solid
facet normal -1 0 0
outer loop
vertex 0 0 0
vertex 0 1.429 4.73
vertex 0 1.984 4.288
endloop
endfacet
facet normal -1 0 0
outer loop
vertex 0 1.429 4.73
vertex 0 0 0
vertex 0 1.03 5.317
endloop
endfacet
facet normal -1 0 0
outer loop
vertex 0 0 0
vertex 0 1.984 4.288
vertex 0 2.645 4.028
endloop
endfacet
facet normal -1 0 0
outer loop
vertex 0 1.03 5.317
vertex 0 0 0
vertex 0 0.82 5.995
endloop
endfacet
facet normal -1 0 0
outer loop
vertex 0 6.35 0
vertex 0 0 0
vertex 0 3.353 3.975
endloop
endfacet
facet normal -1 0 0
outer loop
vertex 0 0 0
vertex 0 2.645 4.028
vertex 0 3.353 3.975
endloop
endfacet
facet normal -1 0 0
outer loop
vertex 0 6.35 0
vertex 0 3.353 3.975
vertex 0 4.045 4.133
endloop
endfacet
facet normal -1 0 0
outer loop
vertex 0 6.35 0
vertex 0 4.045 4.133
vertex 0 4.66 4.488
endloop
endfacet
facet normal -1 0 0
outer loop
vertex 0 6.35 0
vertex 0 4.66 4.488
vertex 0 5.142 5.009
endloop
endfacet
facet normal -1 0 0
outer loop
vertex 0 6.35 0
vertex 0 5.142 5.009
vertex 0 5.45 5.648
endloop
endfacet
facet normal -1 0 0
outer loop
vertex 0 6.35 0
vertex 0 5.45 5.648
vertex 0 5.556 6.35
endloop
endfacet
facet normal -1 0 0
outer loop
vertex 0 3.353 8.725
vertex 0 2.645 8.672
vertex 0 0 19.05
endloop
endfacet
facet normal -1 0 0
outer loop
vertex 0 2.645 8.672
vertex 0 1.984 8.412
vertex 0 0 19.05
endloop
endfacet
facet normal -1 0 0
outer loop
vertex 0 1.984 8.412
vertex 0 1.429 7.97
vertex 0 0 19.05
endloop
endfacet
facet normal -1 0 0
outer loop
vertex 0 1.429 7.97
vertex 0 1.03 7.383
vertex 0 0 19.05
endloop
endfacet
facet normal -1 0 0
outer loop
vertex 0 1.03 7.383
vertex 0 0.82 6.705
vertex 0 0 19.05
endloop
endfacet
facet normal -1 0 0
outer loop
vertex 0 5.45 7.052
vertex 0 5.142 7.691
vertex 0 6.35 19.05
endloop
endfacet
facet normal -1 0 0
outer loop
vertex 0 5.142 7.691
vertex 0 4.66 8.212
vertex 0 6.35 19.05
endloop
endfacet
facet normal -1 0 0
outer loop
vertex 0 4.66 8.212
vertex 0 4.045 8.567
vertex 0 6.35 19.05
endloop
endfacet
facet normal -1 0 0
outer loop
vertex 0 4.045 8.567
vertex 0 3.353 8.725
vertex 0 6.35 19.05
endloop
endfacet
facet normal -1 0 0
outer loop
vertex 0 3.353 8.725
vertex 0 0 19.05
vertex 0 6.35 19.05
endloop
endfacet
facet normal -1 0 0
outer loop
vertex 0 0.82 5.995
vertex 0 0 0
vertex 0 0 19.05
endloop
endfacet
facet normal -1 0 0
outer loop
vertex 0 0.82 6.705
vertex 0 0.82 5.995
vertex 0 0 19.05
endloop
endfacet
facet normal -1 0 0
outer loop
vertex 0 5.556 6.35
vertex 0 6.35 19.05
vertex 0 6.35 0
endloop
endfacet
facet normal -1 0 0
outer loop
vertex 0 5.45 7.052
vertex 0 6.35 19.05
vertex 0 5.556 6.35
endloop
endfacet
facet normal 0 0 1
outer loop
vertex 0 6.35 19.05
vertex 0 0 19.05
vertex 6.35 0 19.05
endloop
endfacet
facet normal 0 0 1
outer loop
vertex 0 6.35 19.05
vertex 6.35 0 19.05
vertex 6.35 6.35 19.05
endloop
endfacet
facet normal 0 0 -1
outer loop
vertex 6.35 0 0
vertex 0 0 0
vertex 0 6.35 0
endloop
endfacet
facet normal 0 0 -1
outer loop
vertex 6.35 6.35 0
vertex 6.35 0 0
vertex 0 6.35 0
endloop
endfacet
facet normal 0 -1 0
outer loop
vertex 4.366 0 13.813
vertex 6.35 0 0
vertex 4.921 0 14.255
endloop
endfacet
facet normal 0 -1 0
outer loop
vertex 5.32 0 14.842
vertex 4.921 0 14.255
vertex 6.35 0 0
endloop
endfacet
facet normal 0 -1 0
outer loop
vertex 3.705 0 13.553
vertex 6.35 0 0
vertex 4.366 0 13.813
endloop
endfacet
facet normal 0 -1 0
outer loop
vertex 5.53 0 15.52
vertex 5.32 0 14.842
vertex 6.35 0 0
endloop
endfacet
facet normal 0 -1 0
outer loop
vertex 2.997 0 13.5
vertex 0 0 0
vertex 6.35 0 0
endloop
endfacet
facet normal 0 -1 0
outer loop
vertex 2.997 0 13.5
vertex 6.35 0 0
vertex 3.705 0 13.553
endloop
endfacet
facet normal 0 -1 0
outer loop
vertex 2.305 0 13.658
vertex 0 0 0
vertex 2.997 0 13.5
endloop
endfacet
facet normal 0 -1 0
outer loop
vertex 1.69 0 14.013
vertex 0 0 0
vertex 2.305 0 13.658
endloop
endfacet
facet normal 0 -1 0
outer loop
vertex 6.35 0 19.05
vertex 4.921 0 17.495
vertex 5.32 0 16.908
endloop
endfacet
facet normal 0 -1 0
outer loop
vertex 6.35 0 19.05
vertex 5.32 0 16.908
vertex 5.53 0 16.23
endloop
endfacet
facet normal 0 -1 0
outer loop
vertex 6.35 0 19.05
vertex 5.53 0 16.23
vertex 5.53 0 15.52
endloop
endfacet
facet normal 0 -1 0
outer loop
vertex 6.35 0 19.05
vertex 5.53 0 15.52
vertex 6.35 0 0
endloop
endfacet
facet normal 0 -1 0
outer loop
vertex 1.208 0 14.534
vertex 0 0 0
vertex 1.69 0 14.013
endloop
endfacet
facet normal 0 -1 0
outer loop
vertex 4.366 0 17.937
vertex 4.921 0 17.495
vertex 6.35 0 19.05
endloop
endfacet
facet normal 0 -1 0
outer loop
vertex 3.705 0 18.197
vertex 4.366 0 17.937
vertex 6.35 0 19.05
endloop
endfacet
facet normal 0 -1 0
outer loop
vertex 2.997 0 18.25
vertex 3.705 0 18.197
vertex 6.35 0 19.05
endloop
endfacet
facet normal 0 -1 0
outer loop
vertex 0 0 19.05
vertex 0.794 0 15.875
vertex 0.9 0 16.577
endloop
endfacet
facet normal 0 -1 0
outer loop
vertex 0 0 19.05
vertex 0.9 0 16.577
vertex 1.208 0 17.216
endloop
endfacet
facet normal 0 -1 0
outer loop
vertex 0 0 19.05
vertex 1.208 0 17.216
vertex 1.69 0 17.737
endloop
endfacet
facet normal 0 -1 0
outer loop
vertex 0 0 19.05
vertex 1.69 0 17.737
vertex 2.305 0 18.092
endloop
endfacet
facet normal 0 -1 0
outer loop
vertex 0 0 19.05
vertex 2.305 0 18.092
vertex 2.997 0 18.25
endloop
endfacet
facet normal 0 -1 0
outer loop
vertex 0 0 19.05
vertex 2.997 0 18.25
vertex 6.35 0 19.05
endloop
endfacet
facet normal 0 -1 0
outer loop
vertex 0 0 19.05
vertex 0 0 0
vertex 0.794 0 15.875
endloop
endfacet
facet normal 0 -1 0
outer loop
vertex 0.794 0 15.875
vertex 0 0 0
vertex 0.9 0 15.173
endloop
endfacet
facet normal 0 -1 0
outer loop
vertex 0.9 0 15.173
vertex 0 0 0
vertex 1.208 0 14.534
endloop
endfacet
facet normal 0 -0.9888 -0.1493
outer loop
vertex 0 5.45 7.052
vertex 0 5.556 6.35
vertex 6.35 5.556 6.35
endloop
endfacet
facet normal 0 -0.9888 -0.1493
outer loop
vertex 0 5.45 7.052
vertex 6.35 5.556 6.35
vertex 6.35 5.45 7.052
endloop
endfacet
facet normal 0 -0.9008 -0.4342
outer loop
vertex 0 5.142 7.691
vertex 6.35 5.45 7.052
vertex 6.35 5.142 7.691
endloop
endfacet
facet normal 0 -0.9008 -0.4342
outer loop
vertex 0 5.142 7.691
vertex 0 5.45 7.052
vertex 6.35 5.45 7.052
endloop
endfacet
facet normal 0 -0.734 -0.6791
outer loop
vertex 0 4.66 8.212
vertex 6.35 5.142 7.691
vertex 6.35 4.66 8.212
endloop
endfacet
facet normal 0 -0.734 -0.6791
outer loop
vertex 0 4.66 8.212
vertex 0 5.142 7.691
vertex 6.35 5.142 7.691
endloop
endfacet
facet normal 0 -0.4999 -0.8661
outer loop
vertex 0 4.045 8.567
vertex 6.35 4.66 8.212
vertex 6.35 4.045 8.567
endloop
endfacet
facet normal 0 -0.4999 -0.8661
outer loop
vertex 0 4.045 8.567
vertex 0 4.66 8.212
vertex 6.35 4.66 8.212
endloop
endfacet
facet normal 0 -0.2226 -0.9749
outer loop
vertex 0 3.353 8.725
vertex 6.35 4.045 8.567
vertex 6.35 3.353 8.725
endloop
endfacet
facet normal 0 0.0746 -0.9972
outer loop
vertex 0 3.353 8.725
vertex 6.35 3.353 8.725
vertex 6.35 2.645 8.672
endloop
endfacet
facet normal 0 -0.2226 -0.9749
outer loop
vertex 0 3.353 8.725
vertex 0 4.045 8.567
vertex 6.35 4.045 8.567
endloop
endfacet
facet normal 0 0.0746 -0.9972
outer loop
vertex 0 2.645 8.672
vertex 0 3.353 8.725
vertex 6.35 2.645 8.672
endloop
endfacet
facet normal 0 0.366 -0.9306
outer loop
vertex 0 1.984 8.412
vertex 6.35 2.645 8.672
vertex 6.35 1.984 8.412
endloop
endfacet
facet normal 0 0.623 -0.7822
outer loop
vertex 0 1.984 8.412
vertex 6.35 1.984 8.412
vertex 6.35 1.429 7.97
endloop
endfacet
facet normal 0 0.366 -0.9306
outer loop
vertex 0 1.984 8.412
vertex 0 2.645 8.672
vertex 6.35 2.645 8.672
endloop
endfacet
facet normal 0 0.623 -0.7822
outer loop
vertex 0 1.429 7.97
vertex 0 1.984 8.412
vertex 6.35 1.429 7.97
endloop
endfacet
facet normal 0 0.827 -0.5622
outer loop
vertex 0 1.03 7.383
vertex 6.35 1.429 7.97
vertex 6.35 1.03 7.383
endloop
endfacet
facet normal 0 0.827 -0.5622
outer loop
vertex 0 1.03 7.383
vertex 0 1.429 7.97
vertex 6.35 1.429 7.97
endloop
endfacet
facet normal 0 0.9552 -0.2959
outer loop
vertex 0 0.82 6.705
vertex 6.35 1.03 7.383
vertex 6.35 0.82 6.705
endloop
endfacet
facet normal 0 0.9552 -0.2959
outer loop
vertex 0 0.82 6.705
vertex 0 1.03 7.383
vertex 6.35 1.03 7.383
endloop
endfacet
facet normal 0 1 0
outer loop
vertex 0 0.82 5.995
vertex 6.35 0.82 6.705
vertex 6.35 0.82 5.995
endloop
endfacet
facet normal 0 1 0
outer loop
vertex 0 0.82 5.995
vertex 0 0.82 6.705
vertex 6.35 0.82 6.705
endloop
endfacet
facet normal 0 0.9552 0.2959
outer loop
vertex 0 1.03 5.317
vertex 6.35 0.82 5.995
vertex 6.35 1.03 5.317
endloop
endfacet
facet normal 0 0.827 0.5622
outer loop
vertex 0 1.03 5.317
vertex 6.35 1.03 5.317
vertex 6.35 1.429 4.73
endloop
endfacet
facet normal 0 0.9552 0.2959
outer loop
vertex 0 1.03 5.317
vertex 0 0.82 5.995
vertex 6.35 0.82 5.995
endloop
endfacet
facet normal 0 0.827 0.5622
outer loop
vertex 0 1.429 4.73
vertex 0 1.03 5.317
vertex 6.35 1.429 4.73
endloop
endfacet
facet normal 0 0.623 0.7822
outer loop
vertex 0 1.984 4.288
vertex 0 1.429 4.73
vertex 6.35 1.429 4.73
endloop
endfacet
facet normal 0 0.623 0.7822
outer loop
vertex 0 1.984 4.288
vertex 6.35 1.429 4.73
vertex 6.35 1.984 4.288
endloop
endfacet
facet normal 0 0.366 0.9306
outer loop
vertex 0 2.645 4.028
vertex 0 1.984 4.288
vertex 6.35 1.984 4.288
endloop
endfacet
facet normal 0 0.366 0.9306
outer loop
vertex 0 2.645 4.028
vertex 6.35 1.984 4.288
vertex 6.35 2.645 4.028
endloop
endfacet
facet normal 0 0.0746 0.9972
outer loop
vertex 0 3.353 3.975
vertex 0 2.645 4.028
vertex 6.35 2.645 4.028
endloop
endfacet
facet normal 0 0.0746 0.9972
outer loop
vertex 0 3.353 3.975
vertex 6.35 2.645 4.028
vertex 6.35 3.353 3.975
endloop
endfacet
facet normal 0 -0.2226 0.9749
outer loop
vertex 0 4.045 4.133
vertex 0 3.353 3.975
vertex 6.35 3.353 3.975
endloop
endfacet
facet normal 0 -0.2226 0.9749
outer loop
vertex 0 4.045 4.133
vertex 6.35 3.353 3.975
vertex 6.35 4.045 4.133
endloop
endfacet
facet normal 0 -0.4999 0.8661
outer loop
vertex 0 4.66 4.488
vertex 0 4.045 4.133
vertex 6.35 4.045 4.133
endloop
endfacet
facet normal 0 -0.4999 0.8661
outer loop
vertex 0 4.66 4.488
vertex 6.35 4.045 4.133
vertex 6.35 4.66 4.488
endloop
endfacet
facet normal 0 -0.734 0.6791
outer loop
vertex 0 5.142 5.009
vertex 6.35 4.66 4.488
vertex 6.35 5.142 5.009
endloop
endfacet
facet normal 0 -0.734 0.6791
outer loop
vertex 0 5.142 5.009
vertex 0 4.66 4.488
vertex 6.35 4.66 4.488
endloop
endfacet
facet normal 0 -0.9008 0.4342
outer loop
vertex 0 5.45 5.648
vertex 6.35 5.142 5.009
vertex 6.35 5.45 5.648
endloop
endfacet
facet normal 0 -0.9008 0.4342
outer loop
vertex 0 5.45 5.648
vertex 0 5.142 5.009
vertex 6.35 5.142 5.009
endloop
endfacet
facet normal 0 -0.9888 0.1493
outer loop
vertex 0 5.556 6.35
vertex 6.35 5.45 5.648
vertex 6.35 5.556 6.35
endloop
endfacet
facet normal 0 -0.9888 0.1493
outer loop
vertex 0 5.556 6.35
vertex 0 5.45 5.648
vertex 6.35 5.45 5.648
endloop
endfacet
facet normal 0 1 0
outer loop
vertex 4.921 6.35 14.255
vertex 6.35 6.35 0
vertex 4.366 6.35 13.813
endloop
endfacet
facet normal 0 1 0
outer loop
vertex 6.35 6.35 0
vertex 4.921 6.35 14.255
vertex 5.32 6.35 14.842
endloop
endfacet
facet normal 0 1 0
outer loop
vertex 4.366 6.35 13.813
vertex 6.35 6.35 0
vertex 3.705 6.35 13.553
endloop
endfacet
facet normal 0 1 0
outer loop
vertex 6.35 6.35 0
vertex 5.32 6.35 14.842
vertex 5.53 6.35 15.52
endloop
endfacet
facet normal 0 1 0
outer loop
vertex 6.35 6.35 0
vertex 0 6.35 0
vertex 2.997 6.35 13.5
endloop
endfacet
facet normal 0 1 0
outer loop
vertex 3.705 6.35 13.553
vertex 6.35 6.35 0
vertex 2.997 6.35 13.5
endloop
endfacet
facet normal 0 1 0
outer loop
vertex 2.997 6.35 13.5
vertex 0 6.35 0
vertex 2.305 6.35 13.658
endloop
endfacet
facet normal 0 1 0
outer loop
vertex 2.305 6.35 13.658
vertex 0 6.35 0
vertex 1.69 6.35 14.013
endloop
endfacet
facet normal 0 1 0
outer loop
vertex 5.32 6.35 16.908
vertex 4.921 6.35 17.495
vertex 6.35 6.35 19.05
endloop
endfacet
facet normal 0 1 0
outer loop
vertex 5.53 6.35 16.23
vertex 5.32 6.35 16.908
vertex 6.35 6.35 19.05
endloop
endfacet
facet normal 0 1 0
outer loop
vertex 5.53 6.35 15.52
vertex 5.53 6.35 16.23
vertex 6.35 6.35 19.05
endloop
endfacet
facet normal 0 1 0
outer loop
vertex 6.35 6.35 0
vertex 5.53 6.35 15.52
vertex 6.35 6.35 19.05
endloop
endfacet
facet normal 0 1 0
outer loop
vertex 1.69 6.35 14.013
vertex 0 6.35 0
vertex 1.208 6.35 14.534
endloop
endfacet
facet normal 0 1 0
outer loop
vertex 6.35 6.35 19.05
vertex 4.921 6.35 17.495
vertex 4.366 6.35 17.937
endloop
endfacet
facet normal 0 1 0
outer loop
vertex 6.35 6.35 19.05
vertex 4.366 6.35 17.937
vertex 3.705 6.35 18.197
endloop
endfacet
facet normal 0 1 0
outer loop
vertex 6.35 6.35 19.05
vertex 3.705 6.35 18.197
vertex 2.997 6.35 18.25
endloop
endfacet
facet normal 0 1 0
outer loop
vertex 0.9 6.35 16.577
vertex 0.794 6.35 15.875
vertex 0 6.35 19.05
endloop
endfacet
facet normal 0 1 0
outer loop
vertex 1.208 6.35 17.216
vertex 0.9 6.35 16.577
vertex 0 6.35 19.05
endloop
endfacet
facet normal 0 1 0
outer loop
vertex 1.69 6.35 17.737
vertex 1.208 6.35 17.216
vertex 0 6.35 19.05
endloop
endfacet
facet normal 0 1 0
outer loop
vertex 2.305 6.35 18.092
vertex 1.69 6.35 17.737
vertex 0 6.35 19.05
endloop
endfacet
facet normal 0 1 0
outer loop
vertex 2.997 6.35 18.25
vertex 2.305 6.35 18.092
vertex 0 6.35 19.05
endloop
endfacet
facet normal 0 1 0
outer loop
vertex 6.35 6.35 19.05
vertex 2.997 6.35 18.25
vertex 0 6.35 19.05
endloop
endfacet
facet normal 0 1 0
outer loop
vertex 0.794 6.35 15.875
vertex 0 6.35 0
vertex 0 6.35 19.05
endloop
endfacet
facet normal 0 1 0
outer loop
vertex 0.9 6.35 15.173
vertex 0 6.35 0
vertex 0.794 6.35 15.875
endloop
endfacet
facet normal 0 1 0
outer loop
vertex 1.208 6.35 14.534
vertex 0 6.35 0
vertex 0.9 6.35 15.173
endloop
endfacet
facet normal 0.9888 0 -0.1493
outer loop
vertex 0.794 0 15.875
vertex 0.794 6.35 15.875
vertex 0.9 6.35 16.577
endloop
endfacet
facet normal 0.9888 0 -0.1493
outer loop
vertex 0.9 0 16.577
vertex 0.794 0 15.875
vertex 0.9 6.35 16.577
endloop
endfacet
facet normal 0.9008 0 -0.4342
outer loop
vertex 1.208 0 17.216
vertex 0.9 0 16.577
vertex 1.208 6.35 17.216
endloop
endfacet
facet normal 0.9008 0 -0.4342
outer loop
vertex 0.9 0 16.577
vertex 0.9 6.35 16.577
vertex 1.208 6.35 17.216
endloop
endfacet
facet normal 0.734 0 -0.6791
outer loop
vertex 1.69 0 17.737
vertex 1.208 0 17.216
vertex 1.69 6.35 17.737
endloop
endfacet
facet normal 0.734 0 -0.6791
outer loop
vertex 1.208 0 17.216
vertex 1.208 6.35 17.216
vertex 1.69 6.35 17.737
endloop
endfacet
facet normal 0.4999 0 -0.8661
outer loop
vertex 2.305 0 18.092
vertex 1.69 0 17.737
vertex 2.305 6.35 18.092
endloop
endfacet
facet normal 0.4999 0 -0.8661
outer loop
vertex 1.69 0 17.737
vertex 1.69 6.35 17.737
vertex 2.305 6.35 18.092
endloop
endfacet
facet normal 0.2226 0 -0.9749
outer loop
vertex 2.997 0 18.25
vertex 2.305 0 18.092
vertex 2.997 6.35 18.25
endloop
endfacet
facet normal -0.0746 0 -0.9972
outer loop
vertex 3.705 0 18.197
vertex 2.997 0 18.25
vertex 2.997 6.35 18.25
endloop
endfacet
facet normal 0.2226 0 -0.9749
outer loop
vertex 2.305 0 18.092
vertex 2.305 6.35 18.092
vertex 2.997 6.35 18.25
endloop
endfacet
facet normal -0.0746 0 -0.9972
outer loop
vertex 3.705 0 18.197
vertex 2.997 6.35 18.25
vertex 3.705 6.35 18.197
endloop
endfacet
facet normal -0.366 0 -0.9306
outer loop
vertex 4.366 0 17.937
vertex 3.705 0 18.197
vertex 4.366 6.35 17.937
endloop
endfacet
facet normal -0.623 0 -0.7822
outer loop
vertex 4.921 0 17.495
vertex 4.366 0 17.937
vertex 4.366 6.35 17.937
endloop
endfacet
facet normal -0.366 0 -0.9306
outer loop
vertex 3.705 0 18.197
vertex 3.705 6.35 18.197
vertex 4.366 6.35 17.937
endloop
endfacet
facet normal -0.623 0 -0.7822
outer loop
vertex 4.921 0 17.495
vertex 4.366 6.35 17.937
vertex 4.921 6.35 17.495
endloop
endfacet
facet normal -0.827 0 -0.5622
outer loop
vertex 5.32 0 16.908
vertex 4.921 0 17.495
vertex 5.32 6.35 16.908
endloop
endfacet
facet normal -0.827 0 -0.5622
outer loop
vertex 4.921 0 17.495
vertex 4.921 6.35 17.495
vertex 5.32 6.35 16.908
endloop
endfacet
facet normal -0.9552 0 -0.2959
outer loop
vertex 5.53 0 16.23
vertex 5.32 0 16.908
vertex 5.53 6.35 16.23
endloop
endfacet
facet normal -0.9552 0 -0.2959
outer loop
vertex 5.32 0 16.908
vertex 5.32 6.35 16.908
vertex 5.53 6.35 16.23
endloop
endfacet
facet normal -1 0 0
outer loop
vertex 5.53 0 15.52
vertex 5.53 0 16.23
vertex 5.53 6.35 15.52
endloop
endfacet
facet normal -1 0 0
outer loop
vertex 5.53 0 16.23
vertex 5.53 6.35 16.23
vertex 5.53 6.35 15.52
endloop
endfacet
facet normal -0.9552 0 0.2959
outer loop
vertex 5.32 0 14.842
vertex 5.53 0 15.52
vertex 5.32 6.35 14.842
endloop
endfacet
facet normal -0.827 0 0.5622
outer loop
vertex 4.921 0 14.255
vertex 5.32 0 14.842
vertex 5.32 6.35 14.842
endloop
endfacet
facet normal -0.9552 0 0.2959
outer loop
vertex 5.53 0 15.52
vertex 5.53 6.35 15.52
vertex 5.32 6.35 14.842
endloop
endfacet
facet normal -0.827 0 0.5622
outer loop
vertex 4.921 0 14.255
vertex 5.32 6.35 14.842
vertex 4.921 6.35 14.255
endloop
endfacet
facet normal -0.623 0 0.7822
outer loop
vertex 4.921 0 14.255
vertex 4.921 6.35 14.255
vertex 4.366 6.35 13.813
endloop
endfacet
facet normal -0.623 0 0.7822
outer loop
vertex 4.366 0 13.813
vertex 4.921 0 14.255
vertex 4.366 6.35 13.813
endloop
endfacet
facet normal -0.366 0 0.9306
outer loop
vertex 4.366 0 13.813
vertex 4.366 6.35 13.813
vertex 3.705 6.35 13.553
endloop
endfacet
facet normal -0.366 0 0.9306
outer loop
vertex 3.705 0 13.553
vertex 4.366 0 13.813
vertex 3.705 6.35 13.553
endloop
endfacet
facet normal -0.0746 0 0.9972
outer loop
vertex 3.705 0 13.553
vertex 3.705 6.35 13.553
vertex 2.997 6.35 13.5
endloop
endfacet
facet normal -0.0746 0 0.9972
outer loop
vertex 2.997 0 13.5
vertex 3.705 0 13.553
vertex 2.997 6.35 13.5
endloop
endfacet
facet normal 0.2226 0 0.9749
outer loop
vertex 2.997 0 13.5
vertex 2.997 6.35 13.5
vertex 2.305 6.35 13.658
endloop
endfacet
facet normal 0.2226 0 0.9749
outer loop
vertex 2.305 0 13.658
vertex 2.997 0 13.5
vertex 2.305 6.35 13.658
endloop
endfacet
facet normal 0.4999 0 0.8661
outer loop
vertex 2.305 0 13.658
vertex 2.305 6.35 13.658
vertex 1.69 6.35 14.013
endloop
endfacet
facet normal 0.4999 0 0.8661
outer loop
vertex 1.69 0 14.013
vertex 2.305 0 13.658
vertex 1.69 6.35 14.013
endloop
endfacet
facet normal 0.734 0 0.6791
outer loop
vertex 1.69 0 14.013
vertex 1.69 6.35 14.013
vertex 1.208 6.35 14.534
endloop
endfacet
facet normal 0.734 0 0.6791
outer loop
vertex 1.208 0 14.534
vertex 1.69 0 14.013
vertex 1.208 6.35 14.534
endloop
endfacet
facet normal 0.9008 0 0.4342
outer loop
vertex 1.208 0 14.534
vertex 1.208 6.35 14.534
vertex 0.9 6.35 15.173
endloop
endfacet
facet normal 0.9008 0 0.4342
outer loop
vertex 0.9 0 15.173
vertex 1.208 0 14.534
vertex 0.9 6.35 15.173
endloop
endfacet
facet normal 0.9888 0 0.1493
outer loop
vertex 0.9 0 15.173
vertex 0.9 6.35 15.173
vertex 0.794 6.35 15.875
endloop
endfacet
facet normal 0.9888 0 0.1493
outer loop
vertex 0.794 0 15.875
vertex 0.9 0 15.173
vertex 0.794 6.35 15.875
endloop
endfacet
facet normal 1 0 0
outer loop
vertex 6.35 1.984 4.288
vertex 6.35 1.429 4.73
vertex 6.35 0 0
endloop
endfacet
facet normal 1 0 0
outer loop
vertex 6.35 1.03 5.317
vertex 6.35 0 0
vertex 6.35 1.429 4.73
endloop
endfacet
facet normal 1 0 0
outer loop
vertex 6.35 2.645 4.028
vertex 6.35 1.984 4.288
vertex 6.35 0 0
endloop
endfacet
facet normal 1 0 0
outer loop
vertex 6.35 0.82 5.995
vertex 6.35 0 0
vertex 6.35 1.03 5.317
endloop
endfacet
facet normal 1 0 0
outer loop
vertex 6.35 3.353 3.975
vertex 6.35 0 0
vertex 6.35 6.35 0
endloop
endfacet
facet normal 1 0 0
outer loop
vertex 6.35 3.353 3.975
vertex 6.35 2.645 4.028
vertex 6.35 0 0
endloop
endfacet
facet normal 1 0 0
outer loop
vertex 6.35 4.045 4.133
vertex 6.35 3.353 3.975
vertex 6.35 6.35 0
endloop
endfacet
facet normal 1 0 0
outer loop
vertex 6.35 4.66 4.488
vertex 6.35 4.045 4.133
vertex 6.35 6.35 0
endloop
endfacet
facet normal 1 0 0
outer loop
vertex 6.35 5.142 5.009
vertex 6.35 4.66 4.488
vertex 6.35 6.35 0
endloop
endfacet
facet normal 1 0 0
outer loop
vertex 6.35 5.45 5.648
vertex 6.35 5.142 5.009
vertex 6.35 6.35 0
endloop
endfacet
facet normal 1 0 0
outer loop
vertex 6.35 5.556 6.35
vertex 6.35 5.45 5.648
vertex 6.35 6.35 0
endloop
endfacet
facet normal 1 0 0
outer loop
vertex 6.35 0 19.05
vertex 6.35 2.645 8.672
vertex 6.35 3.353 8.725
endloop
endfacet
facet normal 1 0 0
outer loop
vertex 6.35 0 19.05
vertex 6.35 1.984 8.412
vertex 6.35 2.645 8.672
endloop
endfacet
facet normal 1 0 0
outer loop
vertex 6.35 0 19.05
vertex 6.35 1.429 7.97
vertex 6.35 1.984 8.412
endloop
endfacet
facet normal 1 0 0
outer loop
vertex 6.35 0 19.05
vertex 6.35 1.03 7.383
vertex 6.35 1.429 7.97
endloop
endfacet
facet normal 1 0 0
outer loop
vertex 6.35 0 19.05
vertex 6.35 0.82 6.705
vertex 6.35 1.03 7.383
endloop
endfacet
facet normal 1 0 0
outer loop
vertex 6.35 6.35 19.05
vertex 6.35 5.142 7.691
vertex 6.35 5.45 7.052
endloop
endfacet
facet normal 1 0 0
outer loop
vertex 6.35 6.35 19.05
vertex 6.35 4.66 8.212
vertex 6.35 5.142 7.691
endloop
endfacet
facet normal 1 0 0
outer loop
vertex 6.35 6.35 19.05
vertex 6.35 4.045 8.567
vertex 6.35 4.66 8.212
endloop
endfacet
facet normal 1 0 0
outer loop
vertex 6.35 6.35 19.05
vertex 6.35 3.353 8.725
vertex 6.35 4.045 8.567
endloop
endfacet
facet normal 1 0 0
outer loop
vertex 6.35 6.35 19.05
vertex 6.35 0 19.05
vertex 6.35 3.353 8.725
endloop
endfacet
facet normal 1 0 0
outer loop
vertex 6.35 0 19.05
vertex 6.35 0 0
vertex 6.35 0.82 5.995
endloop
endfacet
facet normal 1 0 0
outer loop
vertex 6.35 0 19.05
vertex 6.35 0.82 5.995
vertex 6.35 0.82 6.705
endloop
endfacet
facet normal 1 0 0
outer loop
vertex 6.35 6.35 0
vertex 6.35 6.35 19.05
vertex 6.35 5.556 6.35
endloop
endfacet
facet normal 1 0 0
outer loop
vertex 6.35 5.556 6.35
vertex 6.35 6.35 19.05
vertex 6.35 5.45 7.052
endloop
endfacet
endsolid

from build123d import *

# Parameters (mm, degrees)
F0_W     = 6.35
F0_H     = 19.05
F0_R     = 2.38125
F1_DEPTH = 6.35
F2_R     = 2.38125
F3_DEPTH = 25.4


with BuildPart() as f1:
    # F0 (on Right) → F1 (new body)
    with BuildSketch(Plane.YZ):
        with Locations((3.175, 9.525)):
            Rectangle(F0_W, F0_H)
        with Locations((3.175, 6.35)):
            Circle(F0_R, mode=Mode.SUBTRACT)
    extrude(amount=F1_DEPTH)

    # F2 (on face) → F3 (cut)
    with BuildSketch(Plane(origin=(0, 6.35, 0), x_dir=(-1, 0, 0), z_dir=(0, 1, 0))):
        with Locations((-3.175, 15.875)):
            Circle(F2_R)
    extrude(amount=-F3_DEPTH, mode=Mode.SUBTRACT)


solid = f1.part
